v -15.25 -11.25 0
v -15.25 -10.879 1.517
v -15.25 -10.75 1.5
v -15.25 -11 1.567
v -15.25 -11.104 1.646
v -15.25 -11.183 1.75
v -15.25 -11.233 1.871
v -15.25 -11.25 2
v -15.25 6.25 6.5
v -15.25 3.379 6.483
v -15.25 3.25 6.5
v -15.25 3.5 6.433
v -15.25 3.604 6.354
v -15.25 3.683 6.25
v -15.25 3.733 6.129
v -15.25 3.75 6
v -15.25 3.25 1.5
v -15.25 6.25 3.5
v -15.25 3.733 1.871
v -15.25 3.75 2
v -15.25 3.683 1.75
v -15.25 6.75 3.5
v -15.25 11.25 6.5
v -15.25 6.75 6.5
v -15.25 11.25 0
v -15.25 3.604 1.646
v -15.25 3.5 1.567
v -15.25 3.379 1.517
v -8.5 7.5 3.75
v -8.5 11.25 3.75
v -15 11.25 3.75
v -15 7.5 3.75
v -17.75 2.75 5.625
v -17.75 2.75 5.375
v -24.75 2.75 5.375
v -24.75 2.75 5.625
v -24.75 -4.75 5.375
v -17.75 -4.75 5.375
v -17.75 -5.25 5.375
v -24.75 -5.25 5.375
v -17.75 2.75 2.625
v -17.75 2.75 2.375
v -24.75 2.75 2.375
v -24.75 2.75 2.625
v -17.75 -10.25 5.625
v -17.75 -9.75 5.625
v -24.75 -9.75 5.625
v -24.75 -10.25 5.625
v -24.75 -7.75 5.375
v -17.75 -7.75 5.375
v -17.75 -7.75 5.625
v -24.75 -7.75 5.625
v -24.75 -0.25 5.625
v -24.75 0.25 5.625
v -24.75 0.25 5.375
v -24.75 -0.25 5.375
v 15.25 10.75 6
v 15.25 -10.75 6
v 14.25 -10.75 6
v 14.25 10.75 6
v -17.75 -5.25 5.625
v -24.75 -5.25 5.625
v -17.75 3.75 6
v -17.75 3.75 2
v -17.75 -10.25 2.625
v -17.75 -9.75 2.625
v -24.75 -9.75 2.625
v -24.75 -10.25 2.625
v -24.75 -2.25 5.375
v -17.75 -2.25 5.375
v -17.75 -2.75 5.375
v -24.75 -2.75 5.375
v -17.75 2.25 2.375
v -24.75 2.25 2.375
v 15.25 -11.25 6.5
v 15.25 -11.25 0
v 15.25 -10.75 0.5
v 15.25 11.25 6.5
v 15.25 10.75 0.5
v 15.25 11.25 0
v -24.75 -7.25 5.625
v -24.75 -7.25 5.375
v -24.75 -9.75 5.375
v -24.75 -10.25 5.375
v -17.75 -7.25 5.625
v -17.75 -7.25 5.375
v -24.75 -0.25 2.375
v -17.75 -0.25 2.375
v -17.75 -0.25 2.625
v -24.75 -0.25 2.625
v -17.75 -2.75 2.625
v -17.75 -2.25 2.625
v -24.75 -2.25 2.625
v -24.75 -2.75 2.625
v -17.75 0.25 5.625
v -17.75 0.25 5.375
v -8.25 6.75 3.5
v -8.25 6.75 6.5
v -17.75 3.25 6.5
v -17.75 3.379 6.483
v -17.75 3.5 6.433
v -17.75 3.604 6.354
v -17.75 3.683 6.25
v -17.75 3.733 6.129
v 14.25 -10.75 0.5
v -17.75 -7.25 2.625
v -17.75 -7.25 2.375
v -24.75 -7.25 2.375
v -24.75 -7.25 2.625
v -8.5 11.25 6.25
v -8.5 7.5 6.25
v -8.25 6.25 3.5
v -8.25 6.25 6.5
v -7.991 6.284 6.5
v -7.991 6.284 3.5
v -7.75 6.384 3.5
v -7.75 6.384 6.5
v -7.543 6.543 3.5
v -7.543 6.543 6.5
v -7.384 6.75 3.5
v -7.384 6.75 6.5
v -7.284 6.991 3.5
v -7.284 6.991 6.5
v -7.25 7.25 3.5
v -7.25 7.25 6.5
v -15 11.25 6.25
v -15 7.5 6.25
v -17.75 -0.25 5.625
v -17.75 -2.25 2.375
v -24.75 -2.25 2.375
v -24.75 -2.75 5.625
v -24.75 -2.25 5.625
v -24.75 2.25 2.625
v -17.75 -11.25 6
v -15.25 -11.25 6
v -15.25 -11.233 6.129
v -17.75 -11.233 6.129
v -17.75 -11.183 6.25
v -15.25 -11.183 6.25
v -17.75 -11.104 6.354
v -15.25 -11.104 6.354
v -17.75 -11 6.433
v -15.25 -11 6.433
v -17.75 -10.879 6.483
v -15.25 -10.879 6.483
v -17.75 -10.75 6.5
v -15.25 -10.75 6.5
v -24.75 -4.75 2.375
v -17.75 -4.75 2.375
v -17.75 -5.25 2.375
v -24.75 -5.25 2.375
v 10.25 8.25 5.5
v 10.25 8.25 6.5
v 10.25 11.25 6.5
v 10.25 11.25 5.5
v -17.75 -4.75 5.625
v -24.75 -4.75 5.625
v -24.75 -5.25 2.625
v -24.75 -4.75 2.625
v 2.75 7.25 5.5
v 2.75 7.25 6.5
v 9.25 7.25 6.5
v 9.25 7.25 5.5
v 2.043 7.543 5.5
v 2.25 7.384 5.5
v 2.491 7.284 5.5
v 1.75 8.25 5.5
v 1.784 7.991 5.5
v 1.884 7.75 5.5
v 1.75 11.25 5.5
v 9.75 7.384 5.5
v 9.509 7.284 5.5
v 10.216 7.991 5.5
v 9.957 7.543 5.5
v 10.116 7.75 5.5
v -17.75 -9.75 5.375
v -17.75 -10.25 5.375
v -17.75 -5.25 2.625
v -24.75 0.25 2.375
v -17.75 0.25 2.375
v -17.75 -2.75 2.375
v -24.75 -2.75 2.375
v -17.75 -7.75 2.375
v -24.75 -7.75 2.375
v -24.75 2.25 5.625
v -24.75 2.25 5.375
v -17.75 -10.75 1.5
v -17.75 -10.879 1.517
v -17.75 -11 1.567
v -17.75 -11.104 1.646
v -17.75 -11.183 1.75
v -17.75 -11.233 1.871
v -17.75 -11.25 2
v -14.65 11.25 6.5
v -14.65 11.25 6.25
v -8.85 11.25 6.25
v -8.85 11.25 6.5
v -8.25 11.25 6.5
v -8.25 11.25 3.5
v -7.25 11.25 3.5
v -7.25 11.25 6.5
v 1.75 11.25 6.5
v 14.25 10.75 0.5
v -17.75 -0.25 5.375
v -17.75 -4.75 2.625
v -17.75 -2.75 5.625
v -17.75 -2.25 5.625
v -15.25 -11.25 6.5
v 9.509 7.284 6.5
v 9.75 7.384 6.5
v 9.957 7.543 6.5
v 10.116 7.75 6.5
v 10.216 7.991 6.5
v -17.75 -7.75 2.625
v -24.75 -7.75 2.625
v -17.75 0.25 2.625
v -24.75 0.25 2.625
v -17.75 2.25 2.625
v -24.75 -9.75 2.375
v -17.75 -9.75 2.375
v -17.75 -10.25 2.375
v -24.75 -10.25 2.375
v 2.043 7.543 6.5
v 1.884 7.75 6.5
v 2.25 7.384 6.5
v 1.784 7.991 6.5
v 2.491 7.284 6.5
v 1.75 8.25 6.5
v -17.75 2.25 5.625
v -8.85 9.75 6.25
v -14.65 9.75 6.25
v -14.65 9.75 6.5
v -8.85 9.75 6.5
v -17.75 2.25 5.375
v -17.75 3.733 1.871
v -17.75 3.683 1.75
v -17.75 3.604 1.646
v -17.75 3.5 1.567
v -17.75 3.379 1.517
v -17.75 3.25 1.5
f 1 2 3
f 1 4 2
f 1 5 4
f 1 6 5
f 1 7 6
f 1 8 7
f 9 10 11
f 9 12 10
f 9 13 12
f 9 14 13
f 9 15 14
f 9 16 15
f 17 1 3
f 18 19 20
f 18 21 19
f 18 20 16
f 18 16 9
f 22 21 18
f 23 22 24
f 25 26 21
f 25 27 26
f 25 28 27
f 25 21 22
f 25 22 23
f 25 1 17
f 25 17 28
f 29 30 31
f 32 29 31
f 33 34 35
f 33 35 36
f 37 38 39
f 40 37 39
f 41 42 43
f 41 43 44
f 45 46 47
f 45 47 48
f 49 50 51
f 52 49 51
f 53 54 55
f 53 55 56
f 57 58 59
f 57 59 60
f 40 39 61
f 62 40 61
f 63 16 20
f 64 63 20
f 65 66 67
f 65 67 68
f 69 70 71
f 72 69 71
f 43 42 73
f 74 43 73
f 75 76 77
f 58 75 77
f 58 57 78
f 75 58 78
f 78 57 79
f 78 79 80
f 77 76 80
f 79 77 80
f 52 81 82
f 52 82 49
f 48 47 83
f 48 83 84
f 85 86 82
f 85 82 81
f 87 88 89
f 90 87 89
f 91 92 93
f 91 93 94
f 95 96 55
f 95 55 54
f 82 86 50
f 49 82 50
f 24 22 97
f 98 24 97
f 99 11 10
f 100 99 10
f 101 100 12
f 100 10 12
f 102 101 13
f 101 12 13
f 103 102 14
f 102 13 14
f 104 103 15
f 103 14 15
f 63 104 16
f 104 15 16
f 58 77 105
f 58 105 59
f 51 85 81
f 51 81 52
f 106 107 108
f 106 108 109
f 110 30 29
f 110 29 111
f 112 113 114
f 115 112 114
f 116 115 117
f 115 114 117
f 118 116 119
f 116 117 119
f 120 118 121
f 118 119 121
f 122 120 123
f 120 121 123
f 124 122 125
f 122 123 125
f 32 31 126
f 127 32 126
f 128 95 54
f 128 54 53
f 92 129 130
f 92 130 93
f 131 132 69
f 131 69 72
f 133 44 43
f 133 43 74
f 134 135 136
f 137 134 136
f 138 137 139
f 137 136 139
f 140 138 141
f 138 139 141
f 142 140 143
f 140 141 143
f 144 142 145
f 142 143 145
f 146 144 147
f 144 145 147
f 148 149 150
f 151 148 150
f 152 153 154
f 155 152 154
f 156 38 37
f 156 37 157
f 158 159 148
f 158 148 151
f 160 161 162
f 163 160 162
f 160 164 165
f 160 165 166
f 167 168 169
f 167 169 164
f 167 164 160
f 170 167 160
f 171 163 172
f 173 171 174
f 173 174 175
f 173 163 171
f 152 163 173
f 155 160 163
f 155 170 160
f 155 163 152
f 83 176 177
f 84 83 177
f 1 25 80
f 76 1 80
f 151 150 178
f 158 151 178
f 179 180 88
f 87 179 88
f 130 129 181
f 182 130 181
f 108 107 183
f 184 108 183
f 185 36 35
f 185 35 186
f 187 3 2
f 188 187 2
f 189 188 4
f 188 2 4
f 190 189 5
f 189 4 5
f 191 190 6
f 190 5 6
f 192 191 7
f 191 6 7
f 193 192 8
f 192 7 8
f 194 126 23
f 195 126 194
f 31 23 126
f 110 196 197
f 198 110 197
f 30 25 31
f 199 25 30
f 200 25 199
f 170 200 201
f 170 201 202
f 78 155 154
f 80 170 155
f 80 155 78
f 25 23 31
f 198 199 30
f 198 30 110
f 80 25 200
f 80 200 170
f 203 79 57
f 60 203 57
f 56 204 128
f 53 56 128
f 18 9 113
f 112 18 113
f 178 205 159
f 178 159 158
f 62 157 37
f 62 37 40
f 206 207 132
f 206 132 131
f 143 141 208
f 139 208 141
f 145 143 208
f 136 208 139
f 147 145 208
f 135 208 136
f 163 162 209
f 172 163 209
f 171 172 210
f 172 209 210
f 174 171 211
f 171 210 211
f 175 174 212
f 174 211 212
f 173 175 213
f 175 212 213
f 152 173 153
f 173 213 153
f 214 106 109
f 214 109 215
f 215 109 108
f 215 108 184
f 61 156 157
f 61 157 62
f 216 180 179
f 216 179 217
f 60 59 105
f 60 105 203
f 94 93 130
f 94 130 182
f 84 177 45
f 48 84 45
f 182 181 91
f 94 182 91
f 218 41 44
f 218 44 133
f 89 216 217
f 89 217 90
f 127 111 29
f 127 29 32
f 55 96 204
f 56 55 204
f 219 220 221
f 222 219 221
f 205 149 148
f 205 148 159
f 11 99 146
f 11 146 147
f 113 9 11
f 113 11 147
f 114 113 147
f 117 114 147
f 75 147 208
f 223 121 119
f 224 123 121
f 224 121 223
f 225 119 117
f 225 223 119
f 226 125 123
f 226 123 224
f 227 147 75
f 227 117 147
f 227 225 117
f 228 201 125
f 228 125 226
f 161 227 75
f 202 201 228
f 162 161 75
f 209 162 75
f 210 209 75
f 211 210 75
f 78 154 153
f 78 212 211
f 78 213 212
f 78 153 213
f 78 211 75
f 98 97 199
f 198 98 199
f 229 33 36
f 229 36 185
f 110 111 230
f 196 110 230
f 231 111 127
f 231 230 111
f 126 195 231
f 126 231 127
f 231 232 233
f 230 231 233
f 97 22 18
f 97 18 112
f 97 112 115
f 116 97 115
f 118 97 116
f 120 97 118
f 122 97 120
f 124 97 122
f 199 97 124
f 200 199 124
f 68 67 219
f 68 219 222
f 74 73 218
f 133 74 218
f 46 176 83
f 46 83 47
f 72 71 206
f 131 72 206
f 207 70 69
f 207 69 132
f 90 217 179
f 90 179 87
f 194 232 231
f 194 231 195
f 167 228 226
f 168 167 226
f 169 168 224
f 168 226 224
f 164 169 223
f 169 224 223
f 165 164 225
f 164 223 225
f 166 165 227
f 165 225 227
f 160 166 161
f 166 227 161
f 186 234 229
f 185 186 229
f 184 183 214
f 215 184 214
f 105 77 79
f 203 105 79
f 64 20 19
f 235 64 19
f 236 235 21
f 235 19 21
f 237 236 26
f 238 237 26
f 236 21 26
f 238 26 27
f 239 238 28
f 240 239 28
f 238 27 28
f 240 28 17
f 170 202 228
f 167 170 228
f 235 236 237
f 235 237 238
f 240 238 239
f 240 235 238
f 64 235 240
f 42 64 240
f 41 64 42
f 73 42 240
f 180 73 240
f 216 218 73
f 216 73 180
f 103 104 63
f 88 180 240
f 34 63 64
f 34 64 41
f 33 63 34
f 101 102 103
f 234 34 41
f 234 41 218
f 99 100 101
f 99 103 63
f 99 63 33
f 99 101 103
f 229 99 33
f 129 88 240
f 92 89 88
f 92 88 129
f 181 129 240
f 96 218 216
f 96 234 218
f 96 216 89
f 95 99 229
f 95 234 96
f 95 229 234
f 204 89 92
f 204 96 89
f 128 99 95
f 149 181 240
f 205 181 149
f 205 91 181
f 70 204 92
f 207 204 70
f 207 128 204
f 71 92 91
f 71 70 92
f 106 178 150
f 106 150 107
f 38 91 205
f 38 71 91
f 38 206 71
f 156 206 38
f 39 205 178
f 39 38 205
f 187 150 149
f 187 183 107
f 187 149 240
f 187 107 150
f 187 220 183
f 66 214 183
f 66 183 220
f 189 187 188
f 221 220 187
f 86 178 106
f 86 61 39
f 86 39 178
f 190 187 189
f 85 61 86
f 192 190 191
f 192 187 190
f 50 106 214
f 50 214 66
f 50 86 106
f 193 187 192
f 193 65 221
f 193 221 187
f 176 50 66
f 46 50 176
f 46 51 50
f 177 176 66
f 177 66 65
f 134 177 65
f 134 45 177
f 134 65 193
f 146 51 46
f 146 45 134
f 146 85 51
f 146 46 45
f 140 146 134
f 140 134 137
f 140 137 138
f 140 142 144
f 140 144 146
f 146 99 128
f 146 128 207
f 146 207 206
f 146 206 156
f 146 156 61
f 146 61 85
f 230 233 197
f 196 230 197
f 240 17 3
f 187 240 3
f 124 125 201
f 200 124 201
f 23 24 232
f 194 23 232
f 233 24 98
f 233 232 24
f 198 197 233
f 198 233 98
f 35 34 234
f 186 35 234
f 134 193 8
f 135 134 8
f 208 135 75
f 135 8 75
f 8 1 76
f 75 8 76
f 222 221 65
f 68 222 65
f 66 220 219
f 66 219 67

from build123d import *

# Parameters (mm, degrees)
F0_W      = 30.5
F0_H      = 22.5
F1_DEPTH  = 6.5
F3_DEPTH  = 3
F4_W      = 7
F4_H      = 4.5
F5_DEPTH  = 3
F6_W      = 6.5
F6_H      = 2.5
F7_DEPTH  = 3.75
F8_W      = 5.8
F8_H      = 1.5
F9_DEPTH  = 0.5
F11_DEPTH = 1
F13_DEPTH = 2.5
F14_W     = 0.5
F14_H     = 0.25
F15_DEPTH = 7
F16_W     = 21.5
F16_H     = 5.5
F17_DEPTH = 1


with BuildPart() as f1:
    # F0 (on Top) → F1 (new body)
    with BuildSketch(Plane.XY):
        Rectangle(F0_W, F0_H)
    extrude(amount=F1_DEPTH)

    # F2 (on face) → F3 (cut)
    with BuildSketch(Plane.XY.offset(6.5)):
        with BuildLine():
            Line((-7.25, 11.25), (-15.25, 11.25))
            Line((-15.25, 11.25), (-15.25, 6.25))
            Line((-15.25, 6.25), (-8.25, 6.25))
            ThreePointArc((-8.25, 6.25), (-7.542893, 6.542893), (-7.25, 7.25))
            Line((-7.25, 7.25), (-7.25, 11.25))
        make_face()
    extrude(amount=-F3_DEPTH, mode=Mode.SUBTRACT)

    # F4 (on face) → F5 (join)
    with BuildSketch(Plane.XY.offset(3.5)):
        with Locations((-11.75, 9)):
            Rectangle(F4_W, F4_H)
    extrude(amount=F5_DEPTH)

    # F6 (on face) → F7 (cut)
    with BuildSketch(Plane(origin=(0, 11.25, 0), x_dir=(-1, 0, 0), z_dir=(0, 1, 0))):
        with Locations((11.75, 5)):
            Rectangle(F6_W, F6_H)
    extrude(amount=-F7_DEPTH, mode=Mode.SUBTRACT)

    # F8 (on face) → F9 (cut)
    with BuildSketch(Plane.XY.offset(6.5)):
        with Locations((-11.75, 10.5)):
            Rectangle(F8_W, F8_H)
    extrude(amount=-F9_DEPTH, mode=Mode.SUBTRACT)

    # F10 (on face) → F11 (cut)
    with BuildSketch(Plane.XY.offset(6.5)):
        with BuildLine():
            Line((10.25, 11.25), (1.75, 11.25))
            Line((1.75, 11.25), (1.75, 8.25))
            ThreePointArc((1.75, 8.25), (2.042893, 7.542893), (2.75, 7.25))
            Line((2.75, 7.25), (9.25, 7.25))
            ThreePointArc((9.25, 7.25), (9.957107, 7.542893), (10.25, 8.25))
            Line((10.25, 8.25), (10.25, 11.25))
        make_face()
    extrude(amount=-F11_DEPTH, mode=Mode.SUBTRACT)

    # F12 (on face) → F13 (join)
    with BuildSketch(Plane(origin=(-15.25, 0, 0), x_dir=(0, -1, 0), z_dir=(-1, 0, 0))):
        with BuildLine():
            Line((10.75, 6.5), (-3.25, 6.5))
            ThreePointArc((-3.25, 6.5), (-3.603553, 6.353553), (-3.75, 6))
            Line((-3.75, 6), (-3.75, 2))
            ThreePointArc((-3.75, 2), (-3.603553, 1.646447), (-3.25, 1.5))
            Line((-3.25, 1.5), (10.75, 1.5))
            ThreePointArc((10.75, 1.5), (11.103553, 1.646447), (11.25, 2))
            Line((11.25, 2), (11.25, 6))
            ThreePointArc((11.25, 6), (11.103553, 6.353553), (10.75, 6.5))
        make_face()
    extrude(amount=F13_DEPTH)

    # F14 (on face) → F15 (join)
    with BuildSketch(Plane(origin=(-17.75, 0, 0), x_dir=(0, -1, 0), z_dir=(-1, 0, 0))):
        with Locations((-2.5, 5.5)):
            Rectangle(F14_W, F14_H)
        with Locations((-2.5, 2.5)):
            Rectangle(F14_W, F14_H)
        with Locations((0, 5.5)):
            Rectangle(F14_W, F14_H)
        with Locations((0, 2.5)):
            Rectangle(F14_W, F14_H)
        with Locations((2.5, 5.5)):
            Rectangle(F14_W, F14_H)
        with Locations((2.5, 2.5)):
            Rectangle(F14_W, F14_H)
        with Locations((5, 5.5)):
            Rectangle(F14_W, F14_H)
        with Locations((5, 2.5)):
            Rectangle(F14_W, F14_H)
        with Locations((7.5, 5.5)):
            Rectangle(F14_W, F14_H)
        with Locations((7.5, 2.5)):
            Rectangle(F14_W, F14_H)
        with Locations((10, 5.5)):
            Rectangle(F14_W, F14_H)
        with Locations((10, 2.5)):
            Rectangle(F14_W, F14_H)
    extrude(amount=F15_DEPTH)

    # F16 (on face) → F17 (cut)
    with BuildSketch(Plane.YZ.offset(15.25)):
        with Locations((0, 3.25)):
            Rectangle(F16_W, F16_H)
    extrude(amount=-F17_DEPTH, mode=Mode.SUBTRACT)


solid = f1.part
